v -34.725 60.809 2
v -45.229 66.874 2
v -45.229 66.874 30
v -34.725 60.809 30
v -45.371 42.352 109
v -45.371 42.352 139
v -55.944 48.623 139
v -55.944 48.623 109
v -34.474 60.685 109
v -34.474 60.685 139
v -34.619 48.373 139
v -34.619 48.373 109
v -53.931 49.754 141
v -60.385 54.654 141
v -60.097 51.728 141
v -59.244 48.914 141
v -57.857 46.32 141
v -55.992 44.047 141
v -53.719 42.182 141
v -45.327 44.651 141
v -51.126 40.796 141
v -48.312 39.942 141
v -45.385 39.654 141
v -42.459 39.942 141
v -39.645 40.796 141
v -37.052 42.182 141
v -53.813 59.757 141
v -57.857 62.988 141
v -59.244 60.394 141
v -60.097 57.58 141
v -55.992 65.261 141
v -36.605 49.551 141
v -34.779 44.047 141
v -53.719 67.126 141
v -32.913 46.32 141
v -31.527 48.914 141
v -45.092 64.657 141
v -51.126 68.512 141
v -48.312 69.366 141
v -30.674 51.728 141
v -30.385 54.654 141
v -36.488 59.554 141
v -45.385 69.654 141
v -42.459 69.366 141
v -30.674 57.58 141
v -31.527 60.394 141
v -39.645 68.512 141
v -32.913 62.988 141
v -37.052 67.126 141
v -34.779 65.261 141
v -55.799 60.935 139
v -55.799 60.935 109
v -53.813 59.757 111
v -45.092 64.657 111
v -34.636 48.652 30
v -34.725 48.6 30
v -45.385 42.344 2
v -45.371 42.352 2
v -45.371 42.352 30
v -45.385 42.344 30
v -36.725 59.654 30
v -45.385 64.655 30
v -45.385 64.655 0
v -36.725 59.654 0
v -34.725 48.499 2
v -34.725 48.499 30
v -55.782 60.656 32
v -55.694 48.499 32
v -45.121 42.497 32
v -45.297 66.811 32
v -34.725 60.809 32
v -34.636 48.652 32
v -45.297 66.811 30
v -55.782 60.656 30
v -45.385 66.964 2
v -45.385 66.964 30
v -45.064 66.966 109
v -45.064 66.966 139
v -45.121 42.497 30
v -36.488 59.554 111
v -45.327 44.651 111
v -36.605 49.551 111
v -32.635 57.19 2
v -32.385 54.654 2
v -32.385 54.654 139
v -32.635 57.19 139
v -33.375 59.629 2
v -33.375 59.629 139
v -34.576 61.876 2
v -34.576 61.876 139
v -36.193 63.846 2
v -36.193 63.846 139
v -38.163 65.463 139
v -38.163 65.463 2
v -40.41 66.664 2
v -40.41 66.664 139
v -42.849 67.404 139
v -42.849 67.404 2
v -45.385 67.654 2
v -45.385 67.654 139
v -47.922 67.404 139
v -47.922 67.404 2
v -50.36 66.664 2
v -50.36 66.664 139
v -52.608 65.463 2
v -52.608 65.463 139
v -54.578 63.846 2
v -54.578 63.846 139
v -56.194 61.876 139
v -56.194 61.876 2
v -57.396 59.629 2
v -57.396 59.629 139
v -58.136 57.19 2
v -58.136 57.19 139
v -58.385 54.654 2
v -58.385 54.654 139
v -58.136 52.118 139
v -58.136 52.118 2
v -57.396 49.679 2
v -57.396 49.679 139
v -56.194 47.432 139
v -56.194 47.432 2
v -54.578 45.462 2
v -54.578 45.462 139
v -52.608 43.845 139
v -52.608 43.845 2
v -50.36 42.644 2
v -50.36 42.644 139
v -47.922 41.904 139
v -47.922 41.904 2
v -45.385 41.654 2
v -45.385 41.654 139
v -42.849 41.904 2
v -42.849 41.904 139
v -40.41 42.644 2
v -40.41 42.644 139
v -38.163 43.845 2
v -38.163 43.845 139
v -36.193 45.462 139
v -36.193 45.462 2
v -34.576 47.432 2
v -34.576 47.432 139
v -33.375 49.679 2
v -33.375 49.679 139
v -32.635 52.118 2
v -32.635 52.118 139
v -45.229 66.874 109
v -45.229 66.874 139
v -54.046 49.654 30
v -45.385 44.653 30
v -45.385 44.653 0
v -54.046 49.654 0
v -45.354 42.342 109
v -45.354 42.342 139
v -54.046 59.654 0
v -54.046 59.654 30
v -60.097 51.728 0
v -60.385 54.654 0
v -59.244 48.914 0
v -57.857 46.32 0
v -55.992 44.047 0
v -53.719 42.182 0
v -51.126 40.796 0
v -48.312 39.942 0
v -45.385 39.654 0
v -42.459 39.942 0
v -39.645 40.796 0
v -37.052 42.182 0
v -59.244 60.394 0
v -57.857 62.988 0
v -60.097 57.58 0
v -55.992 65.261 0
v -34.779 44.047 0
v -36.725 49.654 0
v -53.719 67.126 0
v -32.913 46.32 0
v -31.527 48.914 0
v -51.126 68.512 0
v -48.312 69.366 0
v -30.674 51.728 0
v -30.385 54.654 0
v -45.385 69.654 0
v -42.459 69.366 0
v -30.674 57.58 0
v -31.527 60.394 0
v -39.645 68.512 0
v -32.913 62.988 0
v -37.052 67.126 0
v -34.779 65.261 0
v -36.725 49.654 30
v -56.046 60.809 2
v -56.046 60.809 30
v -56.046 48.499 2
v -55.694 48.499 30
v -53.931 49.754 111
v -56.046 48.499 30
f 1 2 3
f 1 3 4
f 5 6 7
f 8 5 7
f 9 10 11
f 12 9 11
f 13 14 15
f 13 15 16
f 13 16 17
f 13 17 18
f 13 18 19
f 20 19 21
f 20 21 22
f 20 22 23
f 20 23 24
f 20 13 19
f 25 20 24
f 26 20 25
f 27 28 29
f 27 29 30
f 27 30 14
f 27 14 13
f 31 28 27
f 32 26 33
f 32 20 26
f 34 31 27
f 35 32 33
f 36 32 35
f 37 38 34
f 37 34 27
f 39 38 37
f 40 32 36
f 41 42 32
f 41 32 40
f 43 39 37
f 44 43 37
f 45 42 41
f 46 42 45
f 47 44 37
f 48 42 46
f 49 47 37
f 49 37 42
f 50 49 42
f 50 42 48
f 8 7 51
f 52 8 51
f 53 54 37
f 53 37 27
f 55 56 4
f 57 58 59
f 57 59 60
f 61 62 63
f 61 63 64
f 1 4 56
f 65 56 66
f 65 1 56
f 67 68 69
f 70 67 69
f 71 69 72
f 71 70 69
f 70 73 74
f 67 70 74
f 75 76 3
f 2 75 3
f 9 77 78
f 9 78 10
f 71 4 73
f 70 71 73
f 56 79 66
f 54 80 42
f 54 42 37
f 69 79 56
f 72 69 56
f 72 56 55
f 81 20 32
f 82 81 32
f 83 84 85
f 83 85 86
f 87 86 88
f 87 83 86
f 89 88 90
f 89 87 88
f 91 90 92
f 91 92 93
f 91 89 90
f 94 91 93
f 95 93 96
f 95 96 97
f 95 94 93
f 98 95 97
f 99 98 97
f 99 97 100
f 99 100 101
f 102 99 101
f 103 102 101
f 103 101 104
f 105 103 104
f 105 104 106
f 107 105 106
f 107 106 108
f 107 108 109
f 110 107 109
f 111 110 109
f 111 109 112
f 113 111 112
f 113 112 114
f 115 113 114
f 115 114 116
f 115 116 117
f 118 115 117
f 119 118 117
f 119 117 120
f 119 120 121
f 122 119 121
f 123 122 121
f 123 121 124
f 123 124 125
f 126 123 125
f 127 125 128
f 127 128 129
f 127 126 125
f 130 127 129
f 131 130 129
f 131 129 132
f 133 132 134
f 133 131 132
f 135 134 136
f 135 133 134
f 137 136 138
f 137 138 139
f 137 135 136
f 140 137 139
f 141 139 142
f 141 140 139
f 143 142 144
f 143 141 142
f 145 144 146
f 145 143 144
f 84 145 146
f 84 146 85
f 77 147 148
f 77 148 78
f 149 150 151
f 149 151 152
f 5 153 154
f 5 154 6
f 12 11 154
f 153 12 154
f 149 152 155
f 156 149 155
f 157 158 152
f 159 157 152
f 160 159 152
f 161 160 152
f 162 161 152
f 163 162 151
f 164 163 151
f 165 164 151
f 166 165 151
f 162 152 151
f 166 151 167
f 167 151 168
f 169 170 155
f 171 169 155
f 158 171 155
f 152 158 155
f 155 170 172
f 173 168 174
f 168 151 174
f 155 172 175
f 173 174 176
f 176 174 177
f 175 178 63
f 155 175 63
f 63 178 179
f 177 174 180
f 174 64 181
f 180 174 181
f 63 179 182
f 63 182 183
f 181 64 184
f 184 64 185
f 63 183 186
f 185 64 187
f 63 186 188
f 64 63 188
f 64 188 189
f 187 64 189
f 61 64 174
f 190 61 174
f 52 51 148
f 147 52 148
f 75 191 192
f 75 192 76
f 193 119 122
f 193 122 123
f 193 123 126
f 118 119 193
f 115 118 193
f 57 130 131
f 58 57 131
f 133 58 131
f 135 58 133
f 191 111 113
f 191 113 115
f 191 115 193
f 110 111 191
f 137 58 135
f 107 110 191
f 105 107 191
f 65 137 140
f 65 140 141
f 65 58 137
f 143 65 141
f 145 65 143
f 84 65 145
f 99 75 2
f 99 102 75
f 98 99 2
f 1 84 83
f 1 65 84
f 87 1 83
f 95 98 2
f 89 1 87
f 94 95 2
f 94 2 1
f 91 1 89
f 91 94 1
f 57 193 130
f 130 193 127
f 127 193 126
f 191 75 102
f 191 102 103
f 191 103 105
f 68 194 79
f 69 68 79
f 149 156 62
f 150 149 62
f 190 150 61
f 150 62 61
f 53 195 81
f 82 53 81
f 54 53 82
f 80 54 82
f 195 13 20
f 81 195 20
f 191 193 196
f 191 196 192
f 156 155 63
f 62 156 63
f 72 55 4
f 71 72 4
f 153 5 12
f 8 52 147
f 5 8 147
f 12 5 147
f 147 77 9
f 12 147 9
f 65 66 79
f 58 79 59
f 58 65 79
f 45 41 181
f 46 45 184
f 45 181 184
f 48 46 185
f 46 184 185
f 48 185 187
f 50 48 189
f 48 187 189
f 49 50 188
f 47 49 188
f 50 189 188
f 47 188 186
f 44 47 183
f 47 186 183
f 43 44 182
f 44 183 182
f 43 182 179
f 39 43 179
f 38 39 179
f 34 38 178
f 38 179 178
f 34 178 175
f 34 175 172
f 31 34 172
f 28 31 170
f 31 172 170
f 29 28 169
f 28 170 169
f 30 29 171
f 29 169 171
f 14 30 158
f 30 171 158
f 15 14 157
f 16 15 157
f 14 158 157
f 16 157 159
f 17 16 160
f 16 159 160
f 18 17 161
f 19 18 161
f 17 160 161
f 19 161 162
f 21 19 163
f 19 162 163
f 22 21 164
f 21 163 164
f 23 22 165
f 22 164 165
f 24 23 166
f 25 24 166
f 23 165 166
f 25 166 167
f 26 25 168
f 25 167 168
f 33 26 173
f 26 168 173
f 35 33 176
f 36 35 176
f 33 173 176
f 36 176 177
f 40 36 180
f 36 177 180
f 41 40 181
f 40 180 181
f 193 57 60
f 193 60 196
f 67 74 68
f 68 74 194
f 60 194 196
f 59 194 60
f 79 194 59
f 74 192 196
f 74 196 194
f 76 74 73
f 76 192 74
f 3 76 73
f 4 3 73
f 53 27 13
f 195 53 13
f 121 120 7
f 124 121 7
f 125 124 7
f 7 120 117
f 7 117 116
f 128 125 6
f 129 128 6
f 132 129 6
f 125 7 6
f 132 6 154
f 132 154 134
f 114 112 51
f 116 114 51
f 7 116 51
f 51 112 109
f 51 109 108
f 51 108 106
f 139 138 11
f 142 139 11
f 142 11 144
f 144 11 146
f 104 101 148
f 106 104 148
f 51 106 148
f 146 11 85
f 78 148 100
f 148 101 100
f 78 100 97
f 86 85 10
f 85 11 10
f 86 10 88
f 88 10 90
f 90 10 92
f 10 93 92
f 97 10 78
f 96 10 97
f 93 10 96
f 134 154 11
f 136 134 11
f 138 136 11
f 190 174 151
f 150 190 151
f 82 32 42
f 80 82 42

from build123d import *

# Parameters (mm, degrees)
SKETCH1_R          = 15
EXTRUDE1_DEPTH     = 141
EXTRUDE2_DEPTH     = 30
EXTRUDE3_DEPTH     = 30
SHELL5_START       = 30
SHELL5_OUTLINE_R   = 13
SHELL5_DEPTH       = 79
SHELL5_START_2     = 2
SHELL5_2_OUTLINE_R = 13
SHELL5_2_DEPTH     = 137
SHELL5_START_3     = 109
SHELL5_3_DEPTH     = 30
SHELL5_4_DEPTH     = 28
EXTRUDE4_DEPTH     = 2


# Read off the part's stored shape, not the designer's step: Shell5
with BuildPart() as part:
    # Sketch1 → Extrude1 (new body)
    with BuildSketch(Plane.XY):
        with Locations((-45.385330641, 54.653977414)):
            Circle(SKETCH1_R)
    extrude(amount=EXTRUDE1_DEPTH)

    # Sketch2 → Extrude2 (cut)
    with BuildSketch(Plane.XY.offset(141)):
        Polygon((-45.091602644, 64.656924427), (-53.813164855, 59.757219273), (-53.930676827, 49.754272261), (-45.326626587, 44.651030402), (-36.605064376, 49.550735556), (-36.487552404, 59.553682568), align=None)
    extrude(amount=-EXTRUDE2_DEPTH, mode=Mode.SUBTRACT)

    # Sketch5 → Extrude3 (cut)
    with BuildSketch(Plane(origin=(0, 0, 0), x_dir=(-1, 0, 0), z_dir=(0, 0, -1))):
        Polygon((45.385330641, 64.654606726), (36.724531603, 59.65429207), (36.724531603, 49.653662759), (45.385330641, 44.653348103), (54.046129679, 49.653662759), (54.046129679, 59.65429207), align=None)
    extrude(amount=-EXTRUDE3_DEPTH, mode=Mode.SUBTRACT)

    # Shell5 outline → Shell5 (cut)
    with BuildSketch(Plane.XY.offset(SHELL5_START)):
        with Locations((-45.385330641, 54.653977414)):
            Circle(SHELL5_OUTLINE_R)
    extrude(amount=SHELL5_DEPTH, mode=Mode.SUBTRACT)

    # Shell5 2 outline → Shell5 2 (cut)
    with BuildSketch(Plane.XY.offset(SHELL5_START_2)):
        with Locations((-45.385330641, 54.653977414)):
            Circle(SHELL5_2_OUTLINE_R)
        Polygon((-45.064474284, 66.966166161), (-34.474126219, 60.684809586), (-34.618766551, 48.37262084), (-45.353754947, 42.341788668), (-45.371174081, 42.35212032), (-45.385330641, 42.343947026), (-56.046129679, 48.49896222), (-56.046129679, 60.808992609), (-45.385330641, 66.964007803), (-45.228988272, 66.873743494), align=None, mode=Mode.SUBTRACT)
    extrude(amount=SHELL5_2_DEPTH, mode=Mode.SUBTRACT)

    # Shell5 3 outline → Shell5 3 (cut)
    with BuildSketch(Plane.XY.offset(SHELL5_START_3)):
        Polygon((-55.79946268, 60.935333989), (-45.228988272, 66.873743494), (-45.385330641, 66.964007803), (-56.046129679, 60.808992609), (-56.046129679, 48.49896222), (-45.385330641, 42.343947026), (-45.371174081, 42.35212032), (-55.944103012, 48.623145243), align=None)
    extrude(amount=SHELL5_3_DEPTH, mode=Mode.SUBTRACT)

    # Shell5 4 outline → Shell5 4 (cut)
    with BuildSketch(Plane.XY.offset(SHELL5_START_2)):
        Polygon((-34.618766551, 48.37262084), (-34.474126219, 60.684809586), (-45.064474284, 66.966166161), (-45.228988272, 66.873743494), (-34.724531603, 60.808992609), (-34.724531603, 48.49896222), (-45.371174081, 42.35212032), (-45.353754947, 42.341788668), align=None)
    extrude(amount=SHELL5_4_DEPTH, mode=Mode.SUBTRACT)

    # Sketch6 → Extrude4 (add)
    with BuildSketch(Plane.XY.offset(30)):
        Polygon((-34.724531603, 60.808992609), (-45.297222628, 66.811400248), (-55.78180564, 60.656385054), (-55.693697628, 48.49896222), (-45.121006603, 42.496554581), (-34.63642359, 48.651569775), align=None)
    extrude(amount=EXTRUDE4_DEPTH)


solid = part.part
